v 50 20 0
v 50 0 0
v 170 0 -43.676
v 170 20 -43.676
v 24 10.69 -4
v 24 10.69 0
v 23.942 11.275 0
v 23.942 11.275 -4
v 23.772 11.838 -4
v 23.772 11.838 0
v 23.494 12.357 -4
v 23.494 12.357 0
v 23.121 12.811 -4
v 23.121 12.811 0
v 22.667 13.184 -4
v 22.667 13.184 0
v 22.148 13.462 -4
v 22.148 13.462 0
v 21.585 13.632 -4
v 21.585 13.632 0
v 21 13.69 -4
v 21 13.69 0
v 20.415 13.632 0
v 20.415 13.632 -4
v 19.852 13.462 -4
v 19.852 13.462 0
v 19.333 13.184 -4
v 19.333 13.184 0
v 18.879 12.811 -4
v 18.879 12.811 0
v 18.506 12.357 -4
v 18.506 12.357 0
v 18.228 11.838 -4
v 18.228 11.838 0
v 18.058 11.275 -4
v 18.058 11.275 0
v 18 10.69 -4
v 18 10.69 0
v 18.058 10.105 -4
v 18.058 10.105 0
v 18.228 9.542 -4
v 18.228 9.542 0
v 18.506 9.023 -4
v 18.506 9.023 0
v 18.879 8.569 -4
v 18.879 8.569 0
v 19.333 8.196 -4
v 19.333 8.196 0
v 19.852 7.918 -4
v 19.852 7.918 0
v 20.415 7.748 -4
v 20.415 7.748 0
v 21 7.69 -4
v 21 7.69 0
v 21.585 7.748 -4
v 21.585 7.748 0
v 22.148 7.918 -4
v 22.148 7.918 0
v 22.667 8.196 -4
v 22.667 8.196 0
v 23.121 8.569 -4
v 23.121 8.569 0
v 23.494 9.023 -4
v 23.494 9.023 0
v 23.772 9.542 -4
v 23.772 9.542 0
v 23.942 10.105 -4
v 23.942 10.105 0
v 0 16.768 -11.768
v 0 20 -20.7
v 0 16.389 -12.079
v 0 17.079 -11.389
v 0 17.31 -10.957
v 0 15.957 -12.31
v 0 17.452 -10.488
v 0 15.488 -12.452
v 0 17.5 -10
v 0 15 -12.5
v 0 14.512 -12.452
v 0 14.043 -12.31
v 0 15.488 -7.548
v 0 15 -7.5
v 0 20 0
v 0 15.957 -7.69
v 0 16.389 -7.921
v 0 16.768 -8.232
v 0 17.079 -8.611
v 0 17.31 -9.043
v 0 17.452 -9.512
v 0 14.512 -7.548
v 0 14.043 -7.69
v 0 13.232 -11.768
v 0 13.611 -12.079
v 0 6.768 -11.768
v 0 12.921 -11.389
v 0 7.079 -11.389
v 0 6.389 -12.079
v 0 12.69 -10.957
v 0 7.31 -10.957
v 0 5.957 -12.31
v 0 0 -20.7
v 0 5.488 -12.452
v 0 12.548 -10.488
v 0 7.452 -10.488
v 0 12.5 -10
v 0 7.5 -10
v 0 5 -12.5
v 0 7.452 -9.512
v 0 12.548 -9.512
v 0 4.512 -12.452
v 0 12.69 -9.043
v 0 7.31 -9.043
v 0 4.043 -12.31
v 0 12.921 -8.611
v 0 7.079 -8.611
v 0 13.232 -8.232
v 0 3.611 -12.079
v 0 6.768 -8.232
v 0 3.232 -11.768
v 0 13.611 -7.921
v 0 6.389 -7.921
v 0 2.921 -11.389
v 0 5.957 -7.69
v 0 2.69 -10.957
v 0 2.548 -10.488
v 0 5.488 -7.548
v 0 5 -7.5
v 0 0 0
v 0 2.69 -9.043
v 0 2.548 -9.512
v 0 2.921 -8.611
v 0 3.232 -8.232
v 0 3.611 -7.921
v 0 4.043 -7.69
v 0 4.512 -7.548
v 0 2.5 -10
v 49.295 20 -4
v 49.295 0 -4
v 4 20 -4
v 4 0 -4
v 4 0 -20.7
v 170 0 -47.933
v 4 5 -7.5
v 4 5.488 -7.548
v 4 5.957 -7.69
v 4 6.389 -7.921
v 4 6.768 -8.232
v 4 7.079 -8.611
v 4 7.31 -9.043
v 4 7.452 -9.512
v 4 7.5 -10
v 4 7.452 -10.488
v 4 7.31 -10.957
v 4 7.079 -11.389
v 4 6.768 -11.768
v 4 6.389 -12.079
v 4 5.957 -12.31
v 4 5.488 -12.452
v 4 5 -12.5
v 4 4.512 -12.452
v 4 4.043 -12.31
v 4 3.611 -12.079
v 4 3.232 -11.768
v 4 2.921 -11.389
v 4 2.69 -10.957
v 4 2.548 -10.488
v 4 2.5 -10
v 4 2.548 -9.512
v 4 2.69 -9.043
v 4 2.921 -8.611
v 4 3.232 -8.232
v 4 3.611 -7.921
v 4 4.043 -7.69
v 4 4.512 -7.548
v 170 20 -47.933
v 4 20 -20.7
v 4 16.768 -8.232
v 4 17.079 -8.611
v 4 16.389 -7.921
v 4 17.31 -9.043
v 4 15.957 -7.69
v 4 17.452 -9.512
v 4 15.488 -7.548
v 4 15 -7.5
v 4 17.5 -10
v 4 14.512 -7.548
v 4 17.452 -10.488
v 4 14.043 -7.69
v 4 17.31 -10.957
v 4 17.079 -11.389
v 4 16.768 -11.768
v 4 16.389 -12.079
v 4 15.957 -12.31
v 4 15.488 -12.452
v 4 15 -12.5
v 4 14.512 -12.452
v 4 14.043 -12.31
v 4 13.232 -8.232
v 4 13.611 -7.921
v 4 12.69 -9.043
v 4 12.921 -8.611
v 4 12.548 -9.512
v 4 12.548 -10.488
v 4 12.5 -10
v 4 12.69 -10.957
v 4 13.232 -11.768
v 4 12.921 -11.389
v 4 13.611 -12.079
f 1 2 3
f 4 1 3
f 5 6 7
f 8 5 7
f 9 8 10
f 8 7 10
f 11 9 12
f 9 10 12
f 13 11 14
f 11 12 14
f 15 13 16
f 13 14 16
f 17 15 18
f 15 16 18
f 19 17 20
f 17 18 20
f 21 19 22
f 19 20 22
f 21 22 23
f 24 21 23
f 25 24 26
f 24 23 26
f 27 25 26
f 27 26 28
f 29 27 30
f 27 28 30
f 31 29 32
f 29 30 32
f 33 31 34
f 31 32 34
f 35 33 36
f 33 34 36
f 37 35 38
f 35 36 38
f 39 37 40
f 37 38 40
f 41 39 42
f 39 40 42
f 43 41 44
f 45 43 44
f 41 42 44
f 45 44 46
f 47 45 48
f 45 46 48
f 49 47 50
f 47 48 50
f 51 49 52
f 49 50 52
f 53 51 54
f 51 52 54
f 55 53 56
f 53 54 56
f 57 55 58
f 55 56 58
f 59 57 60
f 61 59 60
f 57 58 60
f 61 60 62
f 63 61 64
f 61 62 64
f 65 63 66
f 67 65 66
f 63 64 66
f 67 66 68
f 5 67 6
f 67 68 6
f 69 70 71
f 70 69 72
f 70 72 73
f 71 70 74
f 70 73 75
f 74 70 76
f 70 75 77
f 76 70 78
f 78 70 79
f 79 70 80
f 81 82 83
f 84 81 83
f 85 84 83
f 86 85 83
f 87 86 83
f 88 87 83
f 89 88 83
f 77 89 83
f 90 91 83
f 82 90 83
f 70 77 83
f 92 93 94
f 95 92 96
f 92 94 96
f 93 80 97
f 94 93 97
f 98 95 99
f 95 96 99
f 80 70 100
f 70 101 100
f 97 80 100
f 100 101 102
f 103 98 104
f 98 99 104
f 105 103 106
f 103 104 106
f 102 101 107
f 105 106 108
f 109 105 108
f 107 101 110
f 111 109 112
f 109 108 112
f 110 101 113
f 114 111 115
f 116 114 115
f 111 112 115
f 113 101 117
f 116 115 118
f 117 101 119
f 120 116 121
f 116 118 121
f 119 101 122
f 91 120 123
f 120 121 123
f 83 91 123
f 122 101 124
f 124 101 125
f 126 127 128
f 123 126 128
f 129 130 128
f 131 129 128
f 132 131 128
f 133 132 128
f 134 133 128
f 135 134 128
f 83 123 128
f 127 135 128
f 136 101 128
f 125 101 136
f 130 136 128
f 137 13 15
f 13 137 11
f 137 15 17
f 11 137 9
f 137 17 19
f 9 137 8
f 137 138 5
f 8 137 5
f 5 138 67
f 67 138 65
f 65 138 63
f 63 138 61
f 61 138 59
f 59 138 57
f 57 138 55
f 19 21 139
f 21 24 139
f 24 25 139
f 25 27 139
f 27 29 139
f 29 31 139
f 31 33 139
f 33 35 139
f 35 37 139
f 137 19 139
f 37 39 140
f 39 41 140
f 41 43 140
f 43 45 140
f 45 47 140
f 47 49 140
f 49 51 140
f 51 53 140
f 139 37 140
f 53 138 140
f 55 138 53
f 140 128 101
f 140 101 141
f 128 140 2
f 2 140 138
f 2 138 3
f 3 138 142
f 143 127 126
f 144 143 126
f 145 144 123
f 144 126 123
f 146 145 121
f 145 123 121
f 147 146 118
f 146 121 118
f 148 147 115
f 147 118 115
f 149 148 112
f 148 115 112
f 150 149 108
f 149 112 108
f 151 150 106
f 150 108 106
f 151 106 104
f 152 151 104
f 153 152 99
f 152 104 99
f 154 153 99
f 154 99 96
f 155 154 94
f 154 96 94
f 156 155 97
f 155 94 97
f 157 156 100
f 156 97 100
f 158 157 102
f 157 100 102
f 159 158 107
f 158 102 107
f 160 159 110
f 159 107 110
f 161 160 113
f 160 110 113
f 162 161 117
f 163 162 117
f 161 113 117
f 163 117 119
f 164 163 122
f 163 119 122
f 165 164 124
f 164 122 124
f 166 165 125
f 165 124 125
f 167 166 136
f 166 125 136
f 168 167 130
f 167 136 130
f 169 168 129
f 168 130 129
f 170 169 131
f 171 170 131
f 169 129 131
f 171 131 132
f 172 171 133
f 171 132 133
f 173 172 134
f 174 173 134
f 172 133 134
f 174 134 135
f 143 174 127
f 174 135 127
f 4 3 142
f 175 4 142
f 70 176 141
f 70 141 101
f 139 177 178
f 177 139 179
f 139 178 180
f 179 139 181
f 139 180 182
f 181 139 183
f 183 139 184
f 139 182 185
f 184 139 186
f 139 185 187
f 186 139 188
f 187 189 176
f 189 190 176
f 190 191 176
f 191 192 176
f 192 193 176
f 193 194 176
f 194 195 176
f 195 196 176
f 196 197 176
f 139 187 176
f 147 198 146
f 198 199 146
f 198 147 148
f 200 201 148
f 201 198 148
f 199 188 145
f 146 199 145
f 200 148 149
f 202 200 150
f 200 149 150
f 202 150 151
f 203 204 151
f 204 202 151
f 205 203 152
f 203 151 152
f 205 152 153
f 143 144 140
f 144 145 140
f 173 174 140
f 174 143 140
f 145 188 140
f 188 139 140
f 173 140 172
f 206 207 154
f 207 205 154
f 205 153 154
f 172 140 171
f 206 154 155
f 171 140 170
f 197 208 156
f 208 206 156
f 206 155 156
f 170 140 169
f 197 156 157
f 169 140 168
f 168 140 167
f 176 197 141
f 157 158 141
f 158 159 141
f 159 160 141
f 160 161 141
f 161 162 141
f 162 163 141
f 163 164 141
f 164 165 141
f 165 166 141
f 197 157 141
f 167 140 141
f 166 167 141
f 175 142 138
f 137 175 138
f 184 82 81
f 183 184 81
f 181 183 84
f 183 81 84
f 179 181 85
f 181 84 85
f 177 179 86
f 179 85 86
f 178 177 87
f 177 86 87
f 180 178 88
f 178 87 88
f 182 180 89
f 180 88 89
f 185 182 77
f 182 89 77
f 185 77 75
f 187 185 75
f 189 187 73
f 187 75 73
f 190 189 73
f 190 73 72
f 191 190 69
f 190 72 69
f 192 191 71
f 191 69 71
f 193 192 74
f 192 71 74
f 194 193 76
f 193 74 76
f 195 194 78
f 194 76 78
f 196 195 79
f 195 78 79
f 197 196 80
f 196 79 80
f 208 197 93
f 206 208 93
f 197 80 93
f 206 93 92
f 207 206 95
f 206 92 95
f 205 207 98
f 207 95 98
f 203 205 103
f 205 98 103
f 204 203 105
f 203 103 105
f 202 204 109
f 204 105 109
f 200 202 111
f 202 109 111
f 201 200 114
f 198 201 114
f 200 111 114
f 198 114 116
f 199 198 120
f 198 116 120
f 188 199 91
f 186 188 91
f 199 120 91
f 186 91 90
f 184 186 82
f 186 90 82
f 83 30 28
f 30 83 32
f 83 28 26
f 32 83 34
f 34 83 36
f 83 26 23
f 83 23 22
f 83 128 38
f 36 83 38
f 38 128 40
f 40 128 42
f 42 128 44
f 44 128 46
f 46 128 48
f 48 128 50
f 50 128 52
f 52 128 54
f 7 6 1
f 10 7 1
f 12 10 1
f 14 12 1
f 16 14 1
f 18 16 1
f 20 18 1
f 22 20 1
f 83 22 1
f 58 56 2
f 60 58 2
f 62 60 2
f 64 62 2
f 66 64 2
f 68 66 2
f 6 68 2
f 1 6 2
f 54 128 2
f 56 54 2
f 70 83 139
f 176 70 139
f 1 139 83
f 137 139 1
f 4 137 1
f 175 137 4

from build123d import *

# Parameters (mm, degrees)
EXTRUDE_1_DEPTH     = 20
SKETCH_2_R          = 2.5
CUT_EXTRUDE_1_DEPTH = 4
SKETCH_3_R          = 3
CUT_EXTRUDE_2_DEPTH = 4


with BuildPart() as part:
    # Эскиз1 → Бобышка-Вытянуть1 (new body)
    with BuildSketch(Plane(origin=(0, 0, 0), x_dir=(1, 0, 0), z_dir=(0, 1, 0))):
        Polygon((50, 0), (170, 43.676428112), (170, 47.933139202), (49.294692077, 4), (4, 4), (4, 20.7), (0, 20.7), (0, 4), (0, 0), align=None)
    extrude(amount=EXTRUDE_1_DEPTH)

    # Эскиз2 → Вырез-Вытянуть1 (cut)
    with BuildSketch(Plane.ZY):
        with Locations((-10, 5)):
            Circle(SKETCH_2_R)
        with Locations((-10, 15)):
            Circle(SKETCH_2_R)
    extrude(amount=-CUT_EXTRUDE_1_DEPTH, mode=Mode.SUBTRACT)

    # Эскиз3 → Вырез-Вытянуть2 (cut)
    with BuildSketch(Plane.XY):
        with Locations((21, 10.690090477)):
            Circle(SKETCH_3_R)
    extrude(amount=-CUT_EXTRUDE_2_DEPTH, mode=Mode.SUBTRACT)


solid = part.part
